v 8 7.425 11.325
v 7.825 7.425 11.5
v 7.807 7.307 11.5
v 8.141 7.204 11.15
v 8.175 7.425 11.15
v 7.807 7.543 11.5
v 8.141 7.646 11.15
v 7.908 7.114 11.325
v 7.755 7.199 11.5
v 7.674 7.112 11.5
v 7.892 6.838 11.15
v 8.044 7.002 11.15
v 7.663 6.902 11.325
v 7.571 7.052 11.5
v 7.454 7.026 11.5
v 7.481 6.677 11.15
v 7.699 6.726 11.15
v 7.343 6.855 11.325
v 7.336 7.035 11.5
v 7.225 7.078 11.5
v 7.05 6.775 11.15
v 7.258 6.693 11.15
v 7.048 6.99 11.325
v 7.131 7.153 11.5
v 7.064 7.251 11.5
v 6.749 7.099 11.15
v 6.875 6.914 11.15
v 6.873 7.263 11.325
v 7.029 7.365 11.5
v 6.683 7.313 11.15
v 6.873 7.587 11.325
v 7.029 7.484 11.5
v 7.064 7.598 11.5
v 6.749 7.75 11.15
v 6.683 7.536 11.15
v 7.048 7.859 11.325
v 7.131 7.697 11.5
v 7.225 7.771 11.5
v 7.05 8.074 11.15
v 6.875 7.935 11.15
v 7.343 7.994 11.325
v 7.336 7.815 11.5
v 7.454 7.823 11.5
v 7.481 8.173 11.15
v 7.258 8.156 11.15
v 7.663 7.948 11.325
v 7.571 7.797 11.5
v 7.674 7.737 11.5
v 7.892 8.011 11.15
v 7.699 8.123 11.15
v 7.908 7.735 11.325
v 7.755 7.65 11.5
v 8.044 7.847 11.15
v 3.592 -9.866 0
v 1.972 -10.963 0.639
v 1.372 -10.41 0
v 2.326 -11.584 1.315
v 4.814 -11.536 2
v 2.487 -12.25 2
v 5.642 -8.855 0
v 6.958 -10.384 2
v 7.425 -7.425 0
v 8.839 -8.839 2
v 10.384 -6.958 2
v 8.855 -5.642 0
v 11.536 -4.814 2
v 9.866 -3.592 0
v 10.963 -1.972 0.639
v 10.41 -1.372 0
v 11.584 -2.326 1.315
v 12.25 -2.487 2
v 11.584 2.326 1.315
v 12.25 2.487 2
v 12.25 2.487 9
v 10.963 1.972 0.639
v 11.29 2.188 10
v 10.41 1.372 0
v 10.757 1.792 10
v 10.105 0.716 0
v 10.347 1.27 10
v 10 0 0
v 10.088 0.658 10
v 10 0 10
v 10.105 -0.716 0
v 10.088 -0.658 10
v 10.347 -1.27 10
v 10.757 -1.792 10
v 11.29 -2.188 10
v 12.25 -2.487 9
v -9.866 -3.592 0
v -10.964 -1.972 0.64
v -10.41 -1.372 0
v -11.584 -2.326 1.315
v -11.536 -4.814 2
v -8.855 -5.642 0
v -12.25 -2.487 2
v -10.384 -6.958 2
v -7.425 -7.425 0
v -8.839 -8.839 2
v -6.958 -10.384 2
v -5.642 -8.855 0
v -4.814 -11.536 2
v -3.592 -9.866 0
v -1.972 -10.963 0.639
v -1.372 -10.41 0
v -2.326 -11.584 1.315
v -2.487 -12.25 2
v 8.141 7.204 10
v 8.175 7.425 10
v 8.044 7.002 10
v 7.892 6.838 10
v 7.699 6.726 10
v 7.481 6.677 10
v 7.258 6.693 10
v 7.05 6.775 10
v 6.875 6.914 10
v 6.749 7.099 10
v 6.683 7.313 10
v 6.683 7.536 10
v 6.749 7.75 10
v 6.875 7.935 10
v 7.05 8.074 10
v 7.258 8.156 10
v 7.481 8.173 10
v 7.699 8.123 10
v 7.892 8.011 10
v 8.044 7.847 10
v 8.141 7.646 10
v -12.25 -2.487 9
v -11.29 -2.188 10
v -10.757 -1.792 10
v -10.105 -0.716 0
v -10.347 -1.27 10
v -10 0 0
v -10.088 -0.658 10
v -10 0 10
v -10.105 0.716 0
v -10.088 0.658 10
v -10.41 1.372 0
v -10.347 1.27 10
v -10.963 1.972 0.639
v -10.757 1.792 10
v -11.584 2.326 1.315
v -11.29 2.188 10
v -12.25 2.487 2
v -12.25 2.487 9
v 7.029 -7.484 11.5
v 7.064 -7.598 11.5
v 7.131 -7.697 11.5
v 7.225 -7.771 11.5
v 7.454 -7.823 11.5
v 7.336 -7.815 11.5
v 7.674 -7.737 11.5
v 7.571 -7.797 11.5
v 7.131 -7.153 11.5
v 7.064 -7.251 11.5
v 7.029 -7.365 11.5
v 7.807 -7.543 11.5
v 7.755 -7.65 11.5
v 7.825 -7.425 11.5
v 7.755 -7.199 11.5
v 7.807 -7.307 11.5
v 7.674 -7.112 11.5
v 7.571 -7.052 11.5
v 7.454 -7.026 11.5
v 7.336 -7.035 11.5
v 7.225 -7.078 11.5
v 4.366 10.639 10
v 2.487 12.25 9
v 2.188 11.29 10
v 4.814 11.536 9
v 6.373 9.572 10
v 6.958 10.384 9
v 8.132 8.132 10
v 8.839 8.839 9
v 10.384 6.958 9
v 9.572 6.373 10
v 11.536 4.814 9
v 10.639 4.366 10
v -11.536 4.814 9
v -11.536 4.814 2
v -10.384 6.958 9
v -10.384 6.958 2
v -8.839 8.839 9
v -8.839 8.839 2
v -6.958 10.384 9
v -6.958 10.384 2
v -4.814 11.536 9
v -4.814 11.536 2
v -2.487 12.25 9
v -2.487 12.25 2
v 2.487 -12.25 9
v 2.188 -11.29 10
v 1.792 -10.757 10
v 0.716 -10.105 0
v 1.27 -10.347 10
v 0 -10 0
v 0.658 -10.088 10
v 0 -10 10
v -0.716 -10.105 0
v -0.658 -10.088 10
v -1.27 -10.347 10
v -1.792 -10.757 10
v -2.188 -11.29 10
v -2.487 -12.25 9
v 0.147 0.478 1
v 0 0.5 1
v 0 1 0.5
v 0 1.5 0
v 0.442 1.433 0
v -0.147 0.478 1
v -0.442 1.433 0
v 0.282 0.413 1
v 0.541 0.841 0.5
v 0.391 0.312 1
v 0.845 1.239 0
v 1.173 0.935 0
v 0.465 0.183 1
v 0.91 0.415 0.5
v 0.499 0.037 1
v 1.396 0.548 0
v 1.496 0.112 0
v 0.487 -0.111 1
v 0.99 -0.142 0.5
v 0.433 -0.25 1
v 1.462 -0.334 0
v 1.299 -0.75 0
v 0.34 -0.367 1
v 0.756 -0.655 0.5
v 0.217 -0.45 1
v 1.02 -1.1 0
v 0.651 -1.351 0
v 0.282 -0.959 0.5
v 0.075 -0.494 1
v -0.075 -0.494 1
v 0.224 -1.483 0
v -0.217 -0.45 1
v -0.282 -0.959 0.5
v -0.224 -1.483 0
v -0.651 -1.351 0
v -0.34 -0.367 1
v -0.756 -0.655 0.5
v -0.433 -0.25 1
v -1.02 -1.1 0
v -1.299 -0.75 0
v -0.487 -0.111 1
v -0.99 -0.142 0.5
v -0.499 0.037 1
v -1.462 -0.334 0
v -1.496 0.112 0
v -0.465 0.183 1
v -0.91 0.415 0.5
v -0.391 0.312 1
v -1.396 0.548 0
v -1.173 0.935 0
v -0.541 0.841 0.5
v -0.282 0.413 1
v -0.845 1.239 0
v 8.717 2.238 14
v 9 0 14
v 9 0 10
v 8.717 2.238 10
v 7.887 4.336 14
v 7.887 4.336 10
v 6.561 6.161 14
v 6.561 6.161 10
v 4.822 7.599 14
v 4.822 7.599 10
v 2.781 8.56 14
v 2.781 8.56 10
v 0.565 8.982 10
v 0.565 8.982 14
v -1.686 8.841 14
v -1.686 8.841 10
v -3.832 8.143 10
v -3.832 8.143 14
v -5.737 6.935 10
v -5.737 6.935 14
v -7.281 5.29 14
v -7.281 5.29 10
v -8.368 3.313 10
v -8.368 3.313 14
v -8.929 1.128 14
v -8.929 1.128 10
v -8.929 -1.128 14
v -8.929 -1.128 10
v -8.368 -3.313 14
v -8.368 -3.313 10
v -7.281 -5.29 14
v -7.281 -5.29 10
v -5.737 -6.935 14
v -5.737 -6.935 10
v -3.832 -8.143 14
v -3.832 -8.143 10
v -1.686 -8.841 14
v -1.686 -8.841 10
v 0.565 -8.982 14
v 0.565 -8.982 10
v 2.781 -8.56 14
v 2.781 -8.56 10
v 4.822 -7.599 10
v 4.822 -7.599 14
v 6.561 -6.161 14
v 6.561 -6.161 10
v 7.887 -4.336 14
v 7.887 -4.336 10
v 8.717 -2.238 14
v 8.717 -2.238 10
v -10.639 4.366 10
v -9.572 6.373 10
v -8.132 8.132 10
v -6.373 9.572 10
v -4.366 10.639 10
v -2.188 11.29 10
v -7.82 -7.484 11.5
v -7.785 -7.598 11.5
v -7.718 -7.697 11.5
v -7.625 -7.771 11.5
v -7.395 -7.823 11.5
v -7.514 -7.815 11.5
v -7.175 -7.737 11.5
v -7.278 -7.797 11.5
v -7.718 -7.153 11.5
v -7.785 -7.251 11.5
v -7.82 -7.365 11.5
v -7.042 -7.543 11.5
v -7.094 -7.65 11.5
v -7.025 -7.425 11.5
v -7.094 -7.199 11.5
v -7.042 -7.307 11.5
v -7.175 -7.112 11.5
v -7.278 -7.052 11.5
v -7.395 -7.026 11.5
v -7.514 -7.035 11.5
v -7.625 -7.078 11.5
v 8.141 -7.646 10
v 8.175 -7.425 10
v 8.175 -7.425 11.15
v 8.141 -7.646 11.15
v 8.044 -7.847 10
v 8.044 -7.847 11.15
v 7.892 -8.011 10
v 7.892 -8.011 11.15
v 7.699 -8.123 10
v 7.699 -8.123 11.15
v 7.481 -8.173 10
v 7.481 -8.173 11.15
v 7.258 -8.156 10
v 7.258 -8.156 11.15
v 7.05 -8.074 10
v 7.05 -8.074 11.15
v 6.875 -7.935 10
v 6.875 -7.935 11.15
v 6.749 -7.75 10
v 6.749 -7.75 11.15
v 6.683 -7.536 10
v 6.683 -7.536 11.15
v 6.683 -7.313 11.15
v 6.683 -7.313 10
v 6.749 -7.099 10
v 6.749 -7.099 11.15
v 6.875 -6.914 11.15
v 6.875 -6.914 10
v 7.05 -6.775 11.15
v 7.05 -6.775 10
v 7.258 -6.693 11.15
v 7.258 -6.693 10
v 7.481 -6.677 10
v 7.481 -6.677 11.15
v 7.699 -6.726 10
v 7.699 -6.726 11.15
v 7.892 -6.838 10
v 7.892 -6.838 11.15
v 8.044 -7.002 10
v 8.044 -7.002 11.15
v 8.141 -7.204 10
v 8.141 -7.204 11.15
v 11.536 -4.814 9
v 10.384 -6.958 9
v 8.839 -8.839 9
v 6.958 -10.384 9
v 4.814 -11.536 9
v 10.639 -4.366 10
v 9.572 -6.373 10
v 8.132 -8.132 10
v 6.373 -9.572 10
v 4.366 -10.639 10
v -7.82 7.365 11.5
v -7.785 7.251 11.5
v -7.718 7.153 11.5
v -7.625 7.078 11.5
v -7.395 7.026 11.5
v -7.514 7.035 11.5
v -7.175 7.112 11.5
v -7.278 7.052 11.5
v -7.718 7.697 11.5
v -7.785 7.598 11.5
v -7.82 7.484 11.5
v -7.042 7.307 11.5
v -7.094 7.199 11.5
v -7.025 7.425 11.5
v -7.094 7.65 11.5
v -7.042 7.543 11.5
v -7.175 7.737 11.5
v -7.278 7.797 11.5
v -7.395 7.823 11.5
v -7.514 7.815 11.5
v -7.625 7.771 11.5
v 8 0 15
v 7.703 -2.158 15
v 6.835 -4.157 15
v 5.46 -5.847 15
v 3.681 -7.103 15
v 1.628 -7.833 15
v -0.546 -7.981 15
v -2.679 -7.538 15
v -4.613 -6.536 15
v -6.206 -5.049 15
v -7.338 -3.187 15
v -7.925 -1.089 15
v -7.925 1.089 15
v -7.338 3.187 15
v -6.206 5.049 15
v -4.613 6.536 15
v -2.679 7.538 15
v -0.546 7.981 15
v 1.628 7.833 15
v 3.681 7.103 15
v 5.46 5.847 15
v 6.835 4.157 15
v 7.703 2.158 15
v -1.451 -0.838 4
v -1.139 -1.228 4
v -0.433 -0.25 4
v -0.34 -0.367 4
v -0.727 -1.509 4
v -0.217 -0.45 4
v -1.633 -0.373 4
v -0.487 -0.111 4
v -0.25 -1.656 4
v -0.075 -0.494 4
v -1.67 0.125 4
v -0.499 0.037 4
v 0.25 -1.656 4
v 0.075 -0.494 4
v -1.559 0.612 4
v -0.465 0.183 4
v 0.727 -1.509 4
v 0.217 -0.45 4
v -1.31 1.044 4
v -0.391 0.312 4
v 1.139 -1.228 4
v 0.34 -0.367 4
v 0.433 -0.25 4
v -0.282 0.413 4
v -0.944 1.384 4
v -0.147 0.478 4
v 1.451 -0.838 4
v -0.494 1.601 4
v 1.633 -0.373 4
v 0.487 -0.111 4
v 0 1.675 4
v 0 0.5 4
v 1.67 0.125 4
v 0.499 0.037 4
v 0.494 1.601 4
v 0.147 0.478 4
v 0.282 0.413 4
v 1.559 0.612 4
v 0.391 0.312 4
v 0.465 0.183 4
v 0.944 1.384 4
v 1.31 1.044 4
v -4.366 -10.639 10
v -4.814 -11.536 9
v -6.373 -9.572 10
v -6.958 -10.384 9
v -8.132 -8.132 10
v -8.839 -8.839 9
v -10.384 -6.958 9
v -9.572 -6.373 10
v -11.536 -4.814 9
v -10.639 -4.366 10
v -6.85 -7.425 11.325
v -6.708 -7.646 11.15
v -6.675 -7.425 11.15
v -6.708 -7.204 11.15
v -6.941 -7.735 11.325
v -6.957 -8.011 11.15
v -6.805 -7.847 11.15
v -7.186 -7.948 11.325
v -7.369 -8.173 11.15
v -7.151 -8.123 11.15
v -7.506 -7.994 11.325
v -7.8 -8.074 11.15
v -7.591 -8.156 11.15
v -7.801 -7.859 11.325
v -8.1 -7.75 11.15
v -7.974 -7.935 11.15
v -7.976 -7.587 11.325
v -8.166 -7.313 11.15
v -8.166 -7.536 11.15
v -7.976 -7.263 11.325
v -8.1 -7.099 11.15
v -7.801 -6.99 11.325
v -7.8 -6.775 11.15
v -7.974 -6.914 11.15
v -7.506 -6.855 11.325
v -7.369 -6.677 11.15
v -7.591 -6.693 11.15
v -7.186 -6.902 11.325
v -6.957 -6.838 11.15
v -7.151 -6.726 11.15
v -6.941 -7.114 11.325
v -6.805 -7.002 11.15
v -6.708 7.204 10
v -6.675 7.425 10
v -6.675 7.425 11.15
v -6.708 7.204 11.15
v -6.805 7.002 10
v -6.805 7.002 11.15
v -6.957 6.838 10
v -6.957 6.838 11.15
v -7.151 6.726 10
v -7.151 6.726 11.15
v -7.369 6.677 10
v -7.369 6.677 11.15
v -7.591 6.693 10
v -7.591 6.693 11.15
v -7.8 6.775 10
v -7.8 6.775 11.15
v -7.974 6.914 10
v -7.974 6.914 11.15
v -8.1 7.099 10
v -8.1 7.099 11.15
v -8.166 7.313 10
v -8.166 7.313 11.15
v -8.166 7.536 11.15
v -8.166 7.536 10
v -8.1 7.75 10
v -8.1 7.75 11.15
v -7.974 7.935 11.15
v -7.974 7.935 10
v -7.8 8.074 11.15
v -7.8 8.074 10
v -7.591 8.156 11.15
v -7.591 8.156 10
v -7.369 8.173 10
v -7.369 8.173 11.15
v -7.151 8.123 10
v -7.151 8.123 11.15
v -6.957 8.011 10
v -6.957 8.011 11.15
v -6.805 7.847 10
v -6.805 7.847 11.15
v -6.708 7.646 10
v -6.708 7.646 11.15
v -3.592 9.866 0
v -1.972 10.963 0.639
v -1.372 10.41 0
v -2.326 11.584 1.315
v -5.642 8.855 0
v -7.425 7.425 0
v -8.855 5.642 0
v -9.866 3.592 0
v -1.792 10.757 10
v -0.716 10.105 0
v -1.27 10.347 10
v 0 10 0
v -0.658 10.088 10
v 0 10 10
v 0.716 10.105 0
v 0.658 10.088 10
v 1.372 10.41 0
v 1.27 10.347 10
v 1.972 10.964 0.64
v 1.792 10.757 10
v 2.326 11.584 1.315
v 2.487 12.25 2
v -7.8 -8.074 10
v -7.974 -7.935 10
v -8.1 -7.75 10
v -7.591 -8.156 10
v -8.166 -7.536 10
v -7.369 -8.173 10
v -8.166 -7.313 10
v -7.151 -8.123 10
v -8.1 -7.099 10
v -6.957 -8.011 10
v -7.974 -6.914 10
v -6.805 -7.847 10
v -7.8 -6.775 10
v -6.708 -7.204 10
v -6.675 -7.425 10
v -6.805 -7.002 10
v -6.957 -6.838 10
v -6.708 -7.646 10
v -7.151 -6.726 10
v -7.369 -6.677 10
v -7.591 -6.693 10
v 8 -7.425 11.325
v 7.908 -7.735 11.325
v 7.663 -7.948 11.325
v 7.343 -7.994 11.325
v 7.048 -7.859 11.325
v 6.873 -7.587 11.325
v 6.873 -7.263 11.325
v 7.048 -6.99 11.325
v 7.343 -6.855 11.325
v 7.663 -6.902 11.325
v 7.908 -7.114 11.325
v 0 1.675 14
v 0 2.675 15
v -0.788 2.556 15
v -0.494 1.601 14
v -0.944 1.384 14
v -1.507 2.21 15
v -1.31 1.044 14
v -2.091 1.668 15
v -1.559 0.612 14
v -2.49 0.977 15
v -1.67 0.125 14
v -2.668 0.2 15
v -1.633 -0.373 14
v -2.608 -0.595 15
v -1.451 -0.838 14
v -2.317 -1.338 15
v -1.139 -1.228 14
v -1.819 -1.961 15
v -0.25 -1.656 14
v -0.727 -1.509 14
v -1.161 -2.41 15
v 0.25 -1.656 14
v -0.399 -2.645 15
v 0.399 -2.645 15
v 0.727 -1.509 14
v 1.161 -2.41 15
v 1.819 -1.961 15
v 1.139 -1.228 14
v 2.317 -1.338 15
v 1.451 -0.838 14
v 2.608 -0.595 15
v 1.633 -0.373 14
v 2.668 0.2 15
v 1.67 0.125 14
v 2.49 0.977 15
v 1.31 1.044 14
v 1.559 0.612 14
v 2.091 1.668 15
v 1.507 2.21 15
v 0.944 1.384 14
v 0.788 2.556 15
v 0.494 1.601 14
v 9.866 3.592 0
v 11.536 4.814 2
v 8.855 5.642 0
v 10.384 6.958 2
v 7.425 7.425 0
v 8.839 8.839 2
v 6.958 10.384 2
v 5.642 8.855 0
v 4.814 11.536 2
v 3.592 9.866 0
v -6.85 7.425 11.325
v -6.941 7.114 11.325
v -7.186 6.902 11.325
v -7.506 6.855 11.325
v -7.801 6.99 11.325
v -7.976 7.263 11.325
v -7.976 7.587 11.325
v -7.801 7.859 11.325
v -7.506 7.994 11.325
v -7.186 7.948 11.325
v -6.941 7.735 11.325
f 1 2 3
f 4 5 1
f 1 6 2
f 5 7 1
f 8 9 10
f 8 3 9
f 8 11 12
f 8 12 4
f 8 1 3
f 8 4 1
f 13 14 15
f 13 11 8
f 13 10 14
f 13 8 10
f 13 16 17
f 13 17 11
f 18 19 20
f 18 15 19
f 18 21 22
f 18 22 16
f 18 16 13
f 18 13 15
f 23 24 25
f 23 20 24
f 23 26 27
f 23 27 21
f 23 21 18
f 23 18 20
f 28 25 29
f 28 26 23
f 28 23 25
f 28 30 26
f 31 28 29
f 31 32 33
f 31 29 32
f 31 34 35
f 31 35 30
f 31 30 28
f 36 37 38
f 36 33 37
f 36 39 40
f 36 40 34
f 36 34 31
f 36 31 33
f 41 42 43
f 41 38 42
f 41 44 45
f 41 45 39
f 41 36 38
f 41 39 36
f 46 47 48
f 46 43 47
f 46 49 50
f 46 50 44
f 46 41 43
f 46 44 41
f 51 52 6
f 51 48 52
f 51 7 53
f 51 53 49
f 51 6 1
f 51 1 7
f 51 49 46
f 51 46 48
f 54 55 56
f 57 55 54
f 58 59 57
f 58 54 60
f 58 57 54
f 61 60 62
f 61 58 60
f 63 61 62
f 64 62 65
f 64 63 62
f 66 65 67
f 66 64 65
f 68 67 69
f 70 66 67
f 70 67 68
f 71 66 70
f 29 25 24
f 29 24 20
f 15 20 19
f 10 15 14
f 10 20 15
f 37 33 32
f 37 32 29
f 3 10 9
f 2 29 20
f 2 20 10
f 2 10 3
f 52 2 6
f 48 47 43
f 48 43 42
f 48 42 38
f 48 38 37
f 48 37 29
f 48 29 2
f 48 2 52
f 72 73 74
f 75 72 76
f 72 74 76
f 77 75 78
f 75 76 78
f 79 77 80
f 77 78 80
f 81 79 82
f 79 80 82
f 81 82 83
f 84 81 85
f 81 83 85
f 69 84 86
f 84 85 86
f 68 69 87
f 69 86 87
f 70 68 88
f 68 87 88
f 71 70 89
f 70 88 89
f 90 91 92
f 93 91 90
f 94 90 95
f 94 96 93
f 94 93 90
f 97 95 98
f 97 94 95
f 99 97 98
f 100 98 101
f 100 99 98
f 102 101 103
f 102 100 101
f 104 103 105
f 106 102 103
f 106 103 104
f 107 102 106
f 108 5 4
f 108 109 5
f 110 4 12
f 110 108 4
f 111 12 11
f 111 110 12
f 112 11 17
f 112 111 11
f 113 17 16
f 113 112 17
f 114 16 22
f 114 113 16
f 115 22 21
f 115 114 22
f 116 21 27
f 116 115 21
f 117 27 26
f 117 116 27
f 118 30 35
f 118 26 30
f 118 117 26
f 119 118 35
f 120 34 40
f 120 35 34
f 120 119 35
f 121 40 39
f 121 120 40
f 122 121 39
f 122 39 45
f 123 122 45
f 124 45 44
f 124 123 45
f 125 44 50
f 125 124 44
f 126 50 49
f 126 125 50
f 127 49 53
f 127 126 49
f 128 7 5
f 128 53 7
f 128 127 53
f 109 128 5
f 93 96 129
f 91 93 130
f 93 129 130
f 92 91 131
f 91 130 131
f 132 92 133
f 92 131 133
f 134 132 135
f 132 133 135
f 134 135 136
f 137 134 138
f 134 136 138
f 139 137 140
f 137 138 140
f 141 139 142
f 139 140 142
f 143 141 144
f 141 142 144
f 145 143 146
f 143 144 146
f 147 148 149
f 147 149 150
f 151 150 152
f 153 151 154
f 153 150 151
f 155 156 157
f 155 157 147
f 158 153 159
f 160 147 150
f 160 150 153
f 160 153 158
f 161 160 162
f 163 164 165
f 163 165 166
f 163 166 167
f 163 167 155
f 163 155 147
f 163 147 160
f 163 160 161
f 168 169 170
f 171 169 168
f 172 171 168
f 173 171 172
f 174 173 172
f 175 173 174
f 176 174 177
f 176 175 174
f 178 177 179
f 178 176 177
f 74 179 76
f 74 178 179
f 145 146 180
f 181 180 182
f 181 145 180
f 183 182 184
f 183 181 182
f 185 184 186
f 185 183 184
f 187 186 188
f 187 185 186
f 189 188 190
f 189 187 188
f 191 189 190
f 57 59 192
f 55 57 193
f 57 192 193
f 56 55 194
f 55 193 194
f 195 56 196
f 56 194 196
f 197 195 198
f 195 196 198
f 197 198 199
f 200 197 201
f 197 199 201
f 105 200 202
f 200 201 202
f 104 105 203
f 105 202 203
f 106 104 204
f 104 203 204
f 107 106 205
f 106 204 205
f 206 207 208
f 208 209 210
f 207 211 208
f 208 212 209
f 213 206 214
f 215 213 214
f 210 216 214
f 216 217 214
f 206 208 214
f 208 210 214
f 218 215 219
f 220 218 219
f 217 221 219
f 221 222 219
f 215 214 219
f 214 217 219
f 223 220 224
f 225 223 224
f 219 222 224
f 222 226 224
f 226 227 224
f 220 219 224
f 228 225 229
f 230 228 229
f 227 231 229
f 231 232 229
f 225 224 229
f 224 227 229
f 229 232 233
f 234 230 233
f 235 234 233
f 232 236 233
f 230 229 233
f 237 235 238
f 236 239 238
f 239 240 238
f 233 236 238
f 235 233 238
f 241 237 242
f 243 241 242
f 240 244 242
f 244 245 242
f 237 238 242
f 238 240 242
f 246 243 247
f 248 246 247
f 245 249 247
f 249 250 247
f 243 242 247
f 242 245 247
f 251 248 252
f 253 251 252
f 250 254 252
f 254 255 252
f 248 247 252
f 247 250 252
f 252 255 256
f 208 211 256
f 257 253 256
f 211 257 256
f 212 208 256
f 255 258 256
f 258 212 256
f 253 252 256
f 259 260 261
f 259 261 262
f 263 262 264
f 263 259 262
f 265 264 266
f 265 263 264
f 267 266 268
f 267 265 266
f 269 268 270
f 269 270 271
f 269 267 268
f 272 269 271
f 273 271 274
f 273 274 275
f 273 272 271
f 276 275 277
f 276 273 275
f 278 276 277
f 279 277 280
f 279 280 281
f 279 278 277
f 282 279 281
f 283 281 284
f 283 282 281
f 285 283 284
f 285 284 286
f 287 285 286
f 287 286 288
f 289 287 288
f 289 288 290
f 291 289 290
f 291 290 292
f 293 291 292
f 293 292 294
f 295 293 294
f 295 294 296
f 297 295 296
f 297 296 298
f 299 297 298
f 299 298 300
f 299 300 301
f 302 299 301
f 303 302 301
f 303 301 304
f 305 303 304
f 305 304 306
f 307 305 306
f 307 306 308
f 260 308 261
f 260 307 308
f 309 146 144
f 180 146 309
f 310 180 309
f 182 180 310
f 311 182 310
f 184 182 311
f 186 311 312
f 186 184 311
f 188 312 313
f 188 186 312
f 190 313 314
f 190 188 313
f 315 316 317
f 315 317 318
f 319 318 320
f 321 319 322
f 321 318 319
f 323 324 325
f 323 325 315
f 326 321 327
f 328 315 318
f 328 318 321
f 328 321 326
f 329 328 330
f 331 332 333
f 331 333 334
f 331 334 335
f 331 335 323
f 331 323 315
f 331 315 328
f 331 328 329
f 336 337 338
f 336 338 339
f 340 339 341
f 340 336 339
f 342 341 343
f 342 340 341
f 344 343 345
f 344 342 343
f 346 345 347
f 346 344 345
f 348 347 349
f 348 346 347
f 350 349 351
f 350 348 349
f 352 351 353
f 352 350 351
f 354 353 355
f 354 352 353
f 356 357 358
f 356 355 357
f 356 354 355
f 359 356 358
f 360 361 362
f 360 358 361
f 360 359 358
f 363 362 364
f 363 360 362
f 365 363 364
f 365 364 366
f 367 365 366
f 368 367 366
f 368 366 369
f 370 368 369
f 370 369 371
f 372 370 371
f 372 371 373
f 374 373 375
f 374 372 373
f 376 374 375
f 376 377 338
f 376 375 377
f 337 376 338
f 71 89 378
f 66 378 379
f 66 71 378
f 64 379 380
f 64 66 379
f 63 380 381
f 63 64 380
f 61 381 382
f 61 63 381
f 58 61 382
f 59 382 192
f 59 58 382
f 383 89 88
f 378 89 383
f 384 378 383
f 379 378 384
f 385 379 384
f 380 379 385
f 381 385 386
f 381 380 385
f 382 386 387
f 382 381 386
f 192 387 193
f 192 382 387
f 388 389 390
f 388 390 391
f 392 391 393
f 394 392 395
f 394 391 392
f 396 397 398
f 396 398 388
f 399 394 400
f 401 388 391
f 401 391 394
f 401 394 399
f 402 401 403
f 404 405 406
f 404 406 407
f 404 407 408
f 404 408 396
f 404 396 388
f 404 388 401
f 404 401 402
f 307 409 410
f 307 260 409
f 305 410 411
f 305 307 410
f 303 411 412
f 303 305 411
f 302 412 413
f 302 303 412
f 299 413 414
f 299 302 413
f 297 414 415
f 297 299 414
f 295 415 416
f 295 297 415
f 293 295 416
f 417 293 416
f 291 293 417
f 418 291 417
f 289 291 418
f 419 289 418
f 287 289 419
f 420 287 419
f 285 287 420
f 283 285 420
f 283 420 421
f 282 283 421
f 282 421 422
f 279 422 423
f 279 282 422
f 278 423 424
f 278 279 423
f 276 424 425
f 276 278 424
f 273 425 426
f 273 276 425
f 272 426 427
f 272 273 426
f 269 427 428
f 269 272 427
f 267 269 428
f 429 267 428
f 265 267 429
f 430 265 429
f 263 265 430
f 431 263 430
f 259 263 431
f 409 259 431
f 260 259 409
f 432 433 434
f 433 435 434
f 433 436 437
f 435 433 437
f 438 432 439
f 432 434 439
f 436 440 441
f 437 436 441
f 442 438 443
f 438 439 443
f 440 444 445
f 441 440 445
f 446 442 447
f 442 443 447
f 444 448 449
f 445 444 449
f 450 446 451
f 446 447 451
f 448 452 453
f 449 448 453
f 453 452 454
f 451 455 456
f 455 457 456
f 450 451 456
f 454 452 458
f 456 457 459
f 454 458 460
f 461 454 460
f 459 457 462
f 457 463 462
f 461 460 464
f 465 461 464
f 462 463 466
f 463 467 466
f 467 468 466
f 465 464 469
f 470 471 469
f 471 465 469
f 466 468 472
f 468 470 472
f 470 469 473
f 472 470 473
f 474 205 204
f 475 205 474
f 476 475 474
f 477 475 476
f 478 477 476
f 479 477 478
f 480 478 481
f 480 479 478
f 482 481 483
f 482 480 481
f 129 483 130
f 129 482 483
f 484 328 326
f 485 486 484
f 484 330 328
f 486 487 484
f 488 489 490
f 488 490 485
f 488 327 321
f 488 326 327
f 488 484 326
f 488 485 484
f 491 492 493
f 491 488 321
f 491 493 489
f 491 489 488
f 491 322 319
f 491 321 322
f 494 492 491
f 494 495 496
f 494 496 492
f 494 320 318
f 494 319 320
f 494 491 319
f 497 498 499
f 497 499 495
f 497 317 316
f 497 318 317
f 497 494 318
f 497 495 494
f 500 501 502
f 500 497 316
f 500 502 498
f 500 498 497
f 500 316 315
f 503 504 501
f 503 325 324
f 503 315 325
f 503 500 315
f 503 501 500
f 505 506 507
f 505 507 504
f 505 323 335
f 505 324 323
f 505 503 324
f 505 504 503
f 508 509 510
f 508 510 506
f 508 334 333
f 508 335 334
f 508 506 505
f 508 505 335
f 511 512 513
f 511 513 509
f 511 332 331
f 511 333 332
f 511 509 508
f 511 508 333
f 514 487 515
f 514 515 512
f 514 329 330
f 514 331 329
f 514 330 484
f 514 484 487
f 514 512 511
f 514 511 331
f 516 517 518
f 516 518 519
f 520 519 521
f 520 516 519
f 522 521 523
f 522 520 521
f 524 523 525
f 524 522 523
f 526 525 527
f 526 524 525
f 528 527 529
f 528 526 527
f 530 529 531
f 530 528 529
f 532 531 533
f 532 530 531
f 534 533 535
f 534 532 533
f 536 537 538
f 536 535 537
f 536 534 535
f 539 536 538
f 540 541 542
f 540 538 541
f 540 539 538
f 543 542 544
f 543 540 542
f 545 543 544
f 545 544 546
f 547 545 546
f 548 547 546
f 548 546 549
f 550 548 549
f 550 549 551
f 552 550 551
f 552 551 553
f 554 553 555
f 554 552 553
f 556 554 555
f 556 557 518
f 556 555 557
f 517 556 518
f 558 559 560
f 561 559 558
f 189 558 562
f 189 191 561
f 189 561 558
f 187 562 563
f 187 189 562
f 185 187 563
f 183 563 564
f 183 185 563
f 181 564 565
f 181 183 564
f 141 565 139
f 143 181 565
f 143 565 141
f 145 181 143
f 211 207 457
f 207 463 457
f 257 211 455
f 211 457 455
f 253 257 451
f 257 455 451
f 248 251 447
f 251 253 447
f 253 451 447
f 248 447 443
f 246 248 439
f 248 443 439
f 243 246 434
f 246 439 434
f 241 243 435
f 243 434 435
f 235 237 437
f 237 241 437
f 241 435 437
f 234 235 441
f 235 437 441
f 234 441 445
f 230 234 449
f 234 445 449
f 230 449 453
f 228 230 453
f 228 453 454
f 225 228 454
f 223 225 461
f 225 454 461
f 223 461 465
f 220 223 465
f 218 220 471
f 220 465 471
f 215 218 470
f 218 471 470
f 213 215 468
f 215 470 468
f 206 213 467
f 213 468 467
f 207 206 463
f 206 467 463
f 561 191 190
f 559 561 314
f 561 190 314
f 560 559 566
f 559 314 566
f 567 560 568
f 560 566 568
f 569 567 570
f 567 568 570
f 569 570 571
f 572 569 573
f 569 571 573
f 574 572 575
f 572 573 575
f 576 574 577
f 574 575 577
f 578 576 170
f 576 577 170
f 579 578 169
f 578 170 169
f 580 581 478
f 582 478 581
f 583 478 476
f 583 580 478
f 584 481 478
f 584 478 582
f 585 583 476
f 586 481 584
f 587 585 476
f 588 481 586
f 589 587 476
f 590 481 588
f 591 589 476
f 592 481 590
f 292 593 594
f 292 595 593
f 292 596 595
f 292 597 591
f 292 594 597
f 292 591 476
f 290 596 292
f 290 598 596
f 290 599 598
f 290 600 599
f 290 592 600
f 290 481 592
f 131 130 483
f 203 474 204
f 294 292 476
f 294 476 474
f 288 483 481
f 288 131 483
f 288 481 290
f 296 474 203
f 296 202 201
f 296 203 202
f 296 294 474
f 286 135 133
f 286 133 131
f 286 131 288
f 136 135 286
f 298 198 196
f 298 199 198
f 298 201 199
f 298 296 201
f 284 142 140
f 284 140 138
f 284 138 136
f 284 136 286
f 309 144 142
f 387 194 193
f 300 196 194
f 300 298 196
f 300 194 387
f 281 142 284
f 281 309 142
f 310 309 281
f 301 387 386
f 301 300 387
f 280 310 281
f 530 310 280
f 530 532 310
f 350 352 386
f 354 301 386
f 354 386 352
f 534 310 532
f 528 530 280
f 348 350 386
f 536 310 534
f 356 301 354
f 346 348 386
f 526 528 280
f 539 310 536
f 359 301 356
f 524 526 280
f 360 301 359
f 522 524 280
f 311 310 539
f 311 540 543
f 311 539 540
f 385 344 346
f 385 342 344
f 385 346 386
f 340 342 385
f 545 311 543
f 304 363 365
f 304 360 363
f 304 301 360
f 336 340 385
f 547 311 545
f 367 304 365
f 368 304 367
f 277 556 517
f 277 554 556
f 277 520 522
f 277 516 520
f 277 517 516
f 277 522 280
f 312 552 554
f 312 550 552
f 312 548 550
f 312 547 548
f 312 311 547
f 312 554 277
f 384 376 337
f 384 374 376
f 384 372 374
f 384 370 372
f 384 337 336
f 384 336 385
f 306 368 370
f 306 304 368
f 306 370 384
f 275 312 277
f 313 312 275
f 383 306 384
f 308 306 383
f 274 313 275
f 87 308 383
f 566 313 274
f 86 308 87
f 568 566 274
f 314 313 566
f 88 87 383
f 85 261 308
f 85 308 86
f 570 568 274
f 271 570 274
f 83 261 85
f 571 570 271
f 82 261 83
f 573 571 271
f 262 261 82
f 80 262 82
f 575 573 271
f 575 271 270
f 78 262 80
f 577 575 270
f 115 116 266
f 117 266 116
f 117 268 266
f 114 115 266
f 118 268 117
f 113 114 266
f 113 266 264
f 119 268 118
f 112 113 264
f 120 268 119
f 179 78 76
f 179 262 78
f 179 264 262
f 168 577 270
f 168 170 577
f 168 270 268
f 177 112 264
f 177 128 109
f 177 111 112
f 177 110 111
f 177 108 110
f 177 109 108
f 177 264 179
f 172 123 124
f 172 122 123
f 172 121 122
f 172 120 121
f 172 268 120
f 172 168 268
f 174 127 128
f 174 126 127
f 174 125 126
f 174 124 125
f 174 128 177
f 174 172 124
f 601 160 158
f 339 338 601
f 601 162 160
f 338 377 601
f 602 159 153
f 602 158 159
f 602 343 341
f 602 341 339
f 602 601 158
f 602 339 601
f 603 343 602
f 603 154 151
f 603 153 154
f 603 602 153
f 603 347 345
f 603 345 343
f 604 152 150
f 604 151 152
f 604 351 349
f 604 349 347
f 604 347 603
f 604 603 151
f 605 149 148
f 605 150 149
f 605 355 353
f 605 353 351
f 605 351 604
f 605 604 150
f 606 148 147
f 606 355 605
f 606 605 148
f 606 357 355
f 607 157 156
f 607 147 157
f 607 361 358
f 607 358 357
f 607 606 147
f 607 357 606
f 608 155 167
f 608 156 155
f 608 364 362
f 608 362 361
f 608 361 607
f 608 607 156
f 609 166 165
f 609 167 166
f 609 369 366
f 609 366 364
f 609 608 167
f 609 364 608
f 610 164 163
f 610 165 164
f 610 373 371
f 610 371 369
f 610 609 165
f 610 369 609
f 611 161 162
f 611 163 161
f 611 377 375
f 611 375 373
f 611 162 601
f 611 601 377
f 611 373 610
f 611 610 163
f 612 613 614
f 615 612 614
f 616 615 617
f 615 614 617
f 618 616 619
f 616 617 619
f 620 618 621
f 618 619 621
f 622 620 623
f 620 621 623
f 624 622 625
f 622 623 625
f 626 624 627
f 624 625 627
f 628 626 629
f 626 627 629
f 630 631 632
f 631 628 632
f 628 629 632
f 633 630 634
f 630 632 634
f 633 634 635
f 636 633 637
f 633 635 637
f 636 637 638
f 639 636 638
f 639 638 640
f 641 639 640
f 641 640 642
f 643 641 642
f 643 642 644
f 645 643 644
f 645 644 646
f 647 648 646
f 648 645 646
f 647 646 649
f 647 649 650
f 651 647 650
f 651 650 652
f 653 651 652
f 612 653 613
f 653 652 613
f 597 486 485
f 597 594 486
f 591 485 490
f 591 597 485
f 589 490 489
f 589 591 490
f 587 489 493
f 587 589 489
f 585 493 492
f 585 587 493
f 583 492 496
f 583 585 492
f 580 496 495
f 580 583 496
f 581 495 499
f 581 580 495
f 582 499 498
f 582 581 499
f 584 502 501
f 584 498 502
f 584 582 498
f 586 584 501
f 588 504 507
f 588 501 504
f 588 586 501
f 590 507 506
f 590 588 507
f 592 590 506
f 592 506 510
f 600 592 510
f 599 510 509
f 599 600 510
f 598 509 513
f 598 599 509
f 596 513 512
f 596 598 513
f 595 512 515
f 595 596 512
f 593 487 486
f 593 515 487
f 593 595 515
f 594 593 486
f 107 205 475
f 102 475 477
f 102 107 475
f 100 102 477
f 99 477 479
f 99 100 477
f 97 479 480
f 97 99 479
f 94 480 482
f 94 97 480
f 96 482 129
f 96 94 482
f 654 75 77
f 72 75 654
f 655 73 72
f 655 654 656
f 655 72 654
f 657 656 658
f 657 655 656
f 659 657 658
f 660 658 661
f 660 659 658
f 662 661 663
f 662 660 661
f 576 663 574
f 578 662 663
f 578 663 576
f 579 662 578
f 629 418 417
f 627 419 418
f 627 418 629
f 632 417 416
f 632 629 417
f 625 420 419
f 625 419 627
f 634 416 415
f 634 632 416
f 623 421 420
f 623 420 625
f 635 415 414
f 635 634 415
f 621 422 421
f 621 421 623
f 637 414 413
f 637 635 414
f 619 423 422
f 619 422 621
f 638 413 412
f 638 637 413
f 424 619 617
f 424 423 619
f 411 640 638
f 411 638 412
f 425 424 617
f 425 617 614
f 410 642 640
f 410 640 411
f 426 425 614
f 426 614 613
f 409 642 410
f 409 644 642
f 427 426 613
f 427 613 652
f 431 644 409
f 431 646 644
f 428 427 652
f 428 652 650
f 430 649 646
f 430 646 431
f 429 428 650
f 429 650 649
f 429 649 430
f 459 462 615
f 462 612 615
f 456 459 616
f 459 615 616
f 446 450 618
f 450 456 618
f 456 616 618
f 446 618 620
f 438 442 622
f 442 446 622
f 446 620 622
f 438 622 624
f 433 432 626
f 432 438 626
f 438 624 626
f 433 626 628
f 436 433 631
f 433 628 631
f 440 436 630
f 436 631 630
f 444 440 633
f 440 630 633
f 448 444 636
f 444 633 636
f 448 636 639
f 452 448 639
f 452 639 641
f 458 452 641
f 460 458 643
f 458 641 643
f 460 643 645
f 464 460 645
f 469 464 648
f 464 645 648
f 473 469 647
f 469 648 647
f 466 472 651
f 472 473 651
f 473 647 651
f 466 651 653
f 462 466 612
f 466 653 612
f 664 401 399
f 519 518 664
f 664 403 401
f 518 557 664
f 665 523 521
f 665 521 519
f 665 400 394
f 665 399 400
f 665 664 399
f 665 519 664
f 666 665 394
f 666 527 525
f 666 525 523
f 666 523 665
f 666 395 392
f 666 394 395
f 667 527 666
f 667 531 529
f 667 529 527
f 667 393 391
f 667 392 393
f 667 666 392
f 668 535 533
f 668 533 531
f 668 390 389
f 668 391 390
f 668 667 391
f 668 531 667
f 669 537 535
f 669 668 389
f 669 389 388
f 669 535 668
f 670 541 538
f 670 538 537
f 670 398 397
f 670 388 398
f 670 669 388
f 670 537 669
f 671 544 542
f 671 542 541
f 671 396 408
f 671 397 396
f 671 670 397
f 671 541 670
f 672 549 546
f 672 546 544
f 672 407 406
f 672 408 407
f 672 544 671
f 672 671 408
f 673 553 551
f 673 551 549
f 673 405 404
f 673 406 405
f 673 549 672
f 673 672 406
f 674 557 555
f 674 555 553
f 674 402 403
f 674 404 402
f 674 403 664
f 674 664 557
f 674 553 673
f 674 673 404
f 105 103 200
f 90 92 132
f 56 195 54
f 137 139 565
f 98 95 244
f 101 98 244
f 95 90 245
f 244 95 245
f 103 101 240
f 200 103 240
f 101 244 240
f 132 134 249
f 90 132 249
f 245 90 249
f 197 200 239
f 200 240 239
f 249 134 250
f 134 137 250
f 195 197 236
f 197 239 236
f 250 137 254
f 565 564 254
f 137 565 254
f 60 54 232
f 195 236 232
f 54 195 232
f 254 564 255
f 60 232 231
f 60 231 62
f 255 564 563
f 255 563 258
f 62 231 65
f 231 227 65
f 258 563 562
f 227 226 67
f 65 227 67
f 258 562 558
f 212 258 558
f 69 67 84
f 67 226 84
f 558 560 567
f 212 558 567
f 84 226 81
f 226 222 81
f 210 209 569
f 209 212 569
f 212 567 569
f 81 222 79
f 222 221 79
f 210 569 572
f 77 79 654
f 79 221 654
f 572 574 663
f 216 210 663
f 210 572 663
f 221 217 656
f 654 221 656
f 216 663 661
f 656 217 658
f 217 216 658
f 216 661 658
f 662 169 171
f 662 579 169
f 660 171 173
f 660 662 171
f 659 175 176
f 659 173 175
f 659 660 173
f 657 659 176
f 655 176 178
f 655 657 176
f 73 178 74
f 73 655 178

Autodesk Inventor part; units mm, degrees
ref_plane "YZ Plane" through (0, 0, 0) normal (1, 0, 0) x (0, 1, 0)
ref_plane "XZ Plane" through (0, 0, 0) normal (0, 1, 0) x (-1, 0, 0)
ref_plane "XY Plane" through (0, 0, 0) normal (0, 0, 1) x (1, 0, 0)
sketch "Sketch1" plane through (0, 0, 0) normal (0, 0, 1) x (1, 0, 0)
  circle A0 centre (0, 0) radius 12.5
  dimension "d0" = 25
extrude "Extrusion1" add sketch "Sketch1" along normal blind 15
chamfer "Chamfer2" distance 2 angle 45 1 edges at (-12.5, 0, 0)
sketch "Sketch2" plane through (0, 0, 0) normal (1, 0, 0) x (0, 1, 0)
  line L0 (0, 0) -> (0.5, 0)
  line L1 (0.5, 0) -> (0.5, 4)
  line L2 (0.5, 4) -> (0, 4)
  line L3 (0, 4) -> (0, 0)
  line L4 (12.5, 15) -> (-12.5, 15) projected
  line L5 (0, 4) -> (1.675, 4)
  line L6 (1.675, 4) -> (1.675, 15)
  line L7 (1.675, 15) -> (0, 15)
  line L8 (0, 15) -> (0, 4)
  dimension "d9" = 0.5
  dimension "d10" = 1.675
  dimension "d11" = 4
revolve "Revolution1" cut sketch "Sketch2" angle 360 about axis through (0, 0, 15) along (0, 0, -1)
chamfer "Chamfer3" distance 1 angle 45 2 edges at (0, -0.5, 0) (0, -1.675, 15)
sketch "Sketch3" plane through (0, 0, 15) normal (0, 0, 1) x (1, 0, 0)
  circle A0 centre (0, 0) radius 9
  circle A1 centre (0, 0) radius 0.5 construction
  line L0 (0, 0) -> (26.029, 0) construction
  circle A2 centre (0, 0) radius 12.5 construction
  circle A3 centre (12.5, 0) radius 2.5
  circle A4 centre (0, 12.5) radius 2.5
  circle A5 centre (-12.5, 0) radius 2.5
  circle A6 centre (0, -12.5) radius 2.5
  circle A7 centre (0, 0) radius 12.5
  point P0 (-2.4875, 12.25)
  point P1 (-12.25, 2.4875)
  point P2 (-12.25, -2.4875)
  point P3 (-2.4875, -12.25)
  point P4 (2.4875, -12.25)
  point P5 (12.25, -2.4875)
  point P6 (12.25, 2.4875)
  point P7 (2.4875, 12.25)
  dimension "d16" = 5
  dimension "d19" = 360
  dimension "d21" = 25
  dimension "d22" = 18
extrude "Extrusion2" cut sketch "Sketch3" against normal through all contours A3 A7 | A7 A3 | A7 A4 | A4 A7 | A7 A6 | A6 A7 | A7 A5 | A5 A7
extrude "Extrusion3" cut sketch "Sketch3" against normal blind 5 contours A3 A7 A6 A5 A4
chamfer "Chamfer4" distance 1 angle 45 5 edges at (-9, 0, 15) (-8.8388, -8.8388, 10) (8.8388, -8.8388, 10) (8.8388, 8.8388, 10) (-8.8388, 8.8388, 10)
sketch "Sketch4" plane through (0, 0, 10) normal (0, 0, 1) x (1, 0, 0)
  circle A0 centre (0, 0) radius 0.5 construction
  line L0 (0, 0) -> (-18.6595, 0) construction
  line L1 (0, 0) -> (0, 25.4609) construction
  circle A1 centre (0, 0) radius 1.675 construction
  line L2 (0, 0) -> (-16.5294, 16.5294) construction
  circle A2 centre (-7.4246, 7.4246) radius 0.75
  circle A3 centre (0, 0) radius 2.675 construction
  circle A4 centre (0, 0) radius 10.5 construction
  circle A5 centre (-7.4246, -7.4246) radius 0.75
  circle A6 centre (7.4246, -7.4246) radius 0.75
  circle A7 centre (7.4246, 7.4246) radius 0.75
  point P0 (0, 0)
  dimension "d31" = 21
  dimension "d30" = 45
  dimension "d32" = 1.5
  dimension "d35" = 360
extrude "Extrusion4" add sketch "Sketch4" along normal blind 1.5
chamfer "Chamfer5" distance 0.35 angle 45 4 edges at (6.6746, 7.4246, 11.5) (-8.1746, 7.4246, 11.5) (-8.1746, -7.4246, 11.5) (6.6746, -7.4246, 11.5)
properties part number "centrifugetool_3.2mm_base_v3"
